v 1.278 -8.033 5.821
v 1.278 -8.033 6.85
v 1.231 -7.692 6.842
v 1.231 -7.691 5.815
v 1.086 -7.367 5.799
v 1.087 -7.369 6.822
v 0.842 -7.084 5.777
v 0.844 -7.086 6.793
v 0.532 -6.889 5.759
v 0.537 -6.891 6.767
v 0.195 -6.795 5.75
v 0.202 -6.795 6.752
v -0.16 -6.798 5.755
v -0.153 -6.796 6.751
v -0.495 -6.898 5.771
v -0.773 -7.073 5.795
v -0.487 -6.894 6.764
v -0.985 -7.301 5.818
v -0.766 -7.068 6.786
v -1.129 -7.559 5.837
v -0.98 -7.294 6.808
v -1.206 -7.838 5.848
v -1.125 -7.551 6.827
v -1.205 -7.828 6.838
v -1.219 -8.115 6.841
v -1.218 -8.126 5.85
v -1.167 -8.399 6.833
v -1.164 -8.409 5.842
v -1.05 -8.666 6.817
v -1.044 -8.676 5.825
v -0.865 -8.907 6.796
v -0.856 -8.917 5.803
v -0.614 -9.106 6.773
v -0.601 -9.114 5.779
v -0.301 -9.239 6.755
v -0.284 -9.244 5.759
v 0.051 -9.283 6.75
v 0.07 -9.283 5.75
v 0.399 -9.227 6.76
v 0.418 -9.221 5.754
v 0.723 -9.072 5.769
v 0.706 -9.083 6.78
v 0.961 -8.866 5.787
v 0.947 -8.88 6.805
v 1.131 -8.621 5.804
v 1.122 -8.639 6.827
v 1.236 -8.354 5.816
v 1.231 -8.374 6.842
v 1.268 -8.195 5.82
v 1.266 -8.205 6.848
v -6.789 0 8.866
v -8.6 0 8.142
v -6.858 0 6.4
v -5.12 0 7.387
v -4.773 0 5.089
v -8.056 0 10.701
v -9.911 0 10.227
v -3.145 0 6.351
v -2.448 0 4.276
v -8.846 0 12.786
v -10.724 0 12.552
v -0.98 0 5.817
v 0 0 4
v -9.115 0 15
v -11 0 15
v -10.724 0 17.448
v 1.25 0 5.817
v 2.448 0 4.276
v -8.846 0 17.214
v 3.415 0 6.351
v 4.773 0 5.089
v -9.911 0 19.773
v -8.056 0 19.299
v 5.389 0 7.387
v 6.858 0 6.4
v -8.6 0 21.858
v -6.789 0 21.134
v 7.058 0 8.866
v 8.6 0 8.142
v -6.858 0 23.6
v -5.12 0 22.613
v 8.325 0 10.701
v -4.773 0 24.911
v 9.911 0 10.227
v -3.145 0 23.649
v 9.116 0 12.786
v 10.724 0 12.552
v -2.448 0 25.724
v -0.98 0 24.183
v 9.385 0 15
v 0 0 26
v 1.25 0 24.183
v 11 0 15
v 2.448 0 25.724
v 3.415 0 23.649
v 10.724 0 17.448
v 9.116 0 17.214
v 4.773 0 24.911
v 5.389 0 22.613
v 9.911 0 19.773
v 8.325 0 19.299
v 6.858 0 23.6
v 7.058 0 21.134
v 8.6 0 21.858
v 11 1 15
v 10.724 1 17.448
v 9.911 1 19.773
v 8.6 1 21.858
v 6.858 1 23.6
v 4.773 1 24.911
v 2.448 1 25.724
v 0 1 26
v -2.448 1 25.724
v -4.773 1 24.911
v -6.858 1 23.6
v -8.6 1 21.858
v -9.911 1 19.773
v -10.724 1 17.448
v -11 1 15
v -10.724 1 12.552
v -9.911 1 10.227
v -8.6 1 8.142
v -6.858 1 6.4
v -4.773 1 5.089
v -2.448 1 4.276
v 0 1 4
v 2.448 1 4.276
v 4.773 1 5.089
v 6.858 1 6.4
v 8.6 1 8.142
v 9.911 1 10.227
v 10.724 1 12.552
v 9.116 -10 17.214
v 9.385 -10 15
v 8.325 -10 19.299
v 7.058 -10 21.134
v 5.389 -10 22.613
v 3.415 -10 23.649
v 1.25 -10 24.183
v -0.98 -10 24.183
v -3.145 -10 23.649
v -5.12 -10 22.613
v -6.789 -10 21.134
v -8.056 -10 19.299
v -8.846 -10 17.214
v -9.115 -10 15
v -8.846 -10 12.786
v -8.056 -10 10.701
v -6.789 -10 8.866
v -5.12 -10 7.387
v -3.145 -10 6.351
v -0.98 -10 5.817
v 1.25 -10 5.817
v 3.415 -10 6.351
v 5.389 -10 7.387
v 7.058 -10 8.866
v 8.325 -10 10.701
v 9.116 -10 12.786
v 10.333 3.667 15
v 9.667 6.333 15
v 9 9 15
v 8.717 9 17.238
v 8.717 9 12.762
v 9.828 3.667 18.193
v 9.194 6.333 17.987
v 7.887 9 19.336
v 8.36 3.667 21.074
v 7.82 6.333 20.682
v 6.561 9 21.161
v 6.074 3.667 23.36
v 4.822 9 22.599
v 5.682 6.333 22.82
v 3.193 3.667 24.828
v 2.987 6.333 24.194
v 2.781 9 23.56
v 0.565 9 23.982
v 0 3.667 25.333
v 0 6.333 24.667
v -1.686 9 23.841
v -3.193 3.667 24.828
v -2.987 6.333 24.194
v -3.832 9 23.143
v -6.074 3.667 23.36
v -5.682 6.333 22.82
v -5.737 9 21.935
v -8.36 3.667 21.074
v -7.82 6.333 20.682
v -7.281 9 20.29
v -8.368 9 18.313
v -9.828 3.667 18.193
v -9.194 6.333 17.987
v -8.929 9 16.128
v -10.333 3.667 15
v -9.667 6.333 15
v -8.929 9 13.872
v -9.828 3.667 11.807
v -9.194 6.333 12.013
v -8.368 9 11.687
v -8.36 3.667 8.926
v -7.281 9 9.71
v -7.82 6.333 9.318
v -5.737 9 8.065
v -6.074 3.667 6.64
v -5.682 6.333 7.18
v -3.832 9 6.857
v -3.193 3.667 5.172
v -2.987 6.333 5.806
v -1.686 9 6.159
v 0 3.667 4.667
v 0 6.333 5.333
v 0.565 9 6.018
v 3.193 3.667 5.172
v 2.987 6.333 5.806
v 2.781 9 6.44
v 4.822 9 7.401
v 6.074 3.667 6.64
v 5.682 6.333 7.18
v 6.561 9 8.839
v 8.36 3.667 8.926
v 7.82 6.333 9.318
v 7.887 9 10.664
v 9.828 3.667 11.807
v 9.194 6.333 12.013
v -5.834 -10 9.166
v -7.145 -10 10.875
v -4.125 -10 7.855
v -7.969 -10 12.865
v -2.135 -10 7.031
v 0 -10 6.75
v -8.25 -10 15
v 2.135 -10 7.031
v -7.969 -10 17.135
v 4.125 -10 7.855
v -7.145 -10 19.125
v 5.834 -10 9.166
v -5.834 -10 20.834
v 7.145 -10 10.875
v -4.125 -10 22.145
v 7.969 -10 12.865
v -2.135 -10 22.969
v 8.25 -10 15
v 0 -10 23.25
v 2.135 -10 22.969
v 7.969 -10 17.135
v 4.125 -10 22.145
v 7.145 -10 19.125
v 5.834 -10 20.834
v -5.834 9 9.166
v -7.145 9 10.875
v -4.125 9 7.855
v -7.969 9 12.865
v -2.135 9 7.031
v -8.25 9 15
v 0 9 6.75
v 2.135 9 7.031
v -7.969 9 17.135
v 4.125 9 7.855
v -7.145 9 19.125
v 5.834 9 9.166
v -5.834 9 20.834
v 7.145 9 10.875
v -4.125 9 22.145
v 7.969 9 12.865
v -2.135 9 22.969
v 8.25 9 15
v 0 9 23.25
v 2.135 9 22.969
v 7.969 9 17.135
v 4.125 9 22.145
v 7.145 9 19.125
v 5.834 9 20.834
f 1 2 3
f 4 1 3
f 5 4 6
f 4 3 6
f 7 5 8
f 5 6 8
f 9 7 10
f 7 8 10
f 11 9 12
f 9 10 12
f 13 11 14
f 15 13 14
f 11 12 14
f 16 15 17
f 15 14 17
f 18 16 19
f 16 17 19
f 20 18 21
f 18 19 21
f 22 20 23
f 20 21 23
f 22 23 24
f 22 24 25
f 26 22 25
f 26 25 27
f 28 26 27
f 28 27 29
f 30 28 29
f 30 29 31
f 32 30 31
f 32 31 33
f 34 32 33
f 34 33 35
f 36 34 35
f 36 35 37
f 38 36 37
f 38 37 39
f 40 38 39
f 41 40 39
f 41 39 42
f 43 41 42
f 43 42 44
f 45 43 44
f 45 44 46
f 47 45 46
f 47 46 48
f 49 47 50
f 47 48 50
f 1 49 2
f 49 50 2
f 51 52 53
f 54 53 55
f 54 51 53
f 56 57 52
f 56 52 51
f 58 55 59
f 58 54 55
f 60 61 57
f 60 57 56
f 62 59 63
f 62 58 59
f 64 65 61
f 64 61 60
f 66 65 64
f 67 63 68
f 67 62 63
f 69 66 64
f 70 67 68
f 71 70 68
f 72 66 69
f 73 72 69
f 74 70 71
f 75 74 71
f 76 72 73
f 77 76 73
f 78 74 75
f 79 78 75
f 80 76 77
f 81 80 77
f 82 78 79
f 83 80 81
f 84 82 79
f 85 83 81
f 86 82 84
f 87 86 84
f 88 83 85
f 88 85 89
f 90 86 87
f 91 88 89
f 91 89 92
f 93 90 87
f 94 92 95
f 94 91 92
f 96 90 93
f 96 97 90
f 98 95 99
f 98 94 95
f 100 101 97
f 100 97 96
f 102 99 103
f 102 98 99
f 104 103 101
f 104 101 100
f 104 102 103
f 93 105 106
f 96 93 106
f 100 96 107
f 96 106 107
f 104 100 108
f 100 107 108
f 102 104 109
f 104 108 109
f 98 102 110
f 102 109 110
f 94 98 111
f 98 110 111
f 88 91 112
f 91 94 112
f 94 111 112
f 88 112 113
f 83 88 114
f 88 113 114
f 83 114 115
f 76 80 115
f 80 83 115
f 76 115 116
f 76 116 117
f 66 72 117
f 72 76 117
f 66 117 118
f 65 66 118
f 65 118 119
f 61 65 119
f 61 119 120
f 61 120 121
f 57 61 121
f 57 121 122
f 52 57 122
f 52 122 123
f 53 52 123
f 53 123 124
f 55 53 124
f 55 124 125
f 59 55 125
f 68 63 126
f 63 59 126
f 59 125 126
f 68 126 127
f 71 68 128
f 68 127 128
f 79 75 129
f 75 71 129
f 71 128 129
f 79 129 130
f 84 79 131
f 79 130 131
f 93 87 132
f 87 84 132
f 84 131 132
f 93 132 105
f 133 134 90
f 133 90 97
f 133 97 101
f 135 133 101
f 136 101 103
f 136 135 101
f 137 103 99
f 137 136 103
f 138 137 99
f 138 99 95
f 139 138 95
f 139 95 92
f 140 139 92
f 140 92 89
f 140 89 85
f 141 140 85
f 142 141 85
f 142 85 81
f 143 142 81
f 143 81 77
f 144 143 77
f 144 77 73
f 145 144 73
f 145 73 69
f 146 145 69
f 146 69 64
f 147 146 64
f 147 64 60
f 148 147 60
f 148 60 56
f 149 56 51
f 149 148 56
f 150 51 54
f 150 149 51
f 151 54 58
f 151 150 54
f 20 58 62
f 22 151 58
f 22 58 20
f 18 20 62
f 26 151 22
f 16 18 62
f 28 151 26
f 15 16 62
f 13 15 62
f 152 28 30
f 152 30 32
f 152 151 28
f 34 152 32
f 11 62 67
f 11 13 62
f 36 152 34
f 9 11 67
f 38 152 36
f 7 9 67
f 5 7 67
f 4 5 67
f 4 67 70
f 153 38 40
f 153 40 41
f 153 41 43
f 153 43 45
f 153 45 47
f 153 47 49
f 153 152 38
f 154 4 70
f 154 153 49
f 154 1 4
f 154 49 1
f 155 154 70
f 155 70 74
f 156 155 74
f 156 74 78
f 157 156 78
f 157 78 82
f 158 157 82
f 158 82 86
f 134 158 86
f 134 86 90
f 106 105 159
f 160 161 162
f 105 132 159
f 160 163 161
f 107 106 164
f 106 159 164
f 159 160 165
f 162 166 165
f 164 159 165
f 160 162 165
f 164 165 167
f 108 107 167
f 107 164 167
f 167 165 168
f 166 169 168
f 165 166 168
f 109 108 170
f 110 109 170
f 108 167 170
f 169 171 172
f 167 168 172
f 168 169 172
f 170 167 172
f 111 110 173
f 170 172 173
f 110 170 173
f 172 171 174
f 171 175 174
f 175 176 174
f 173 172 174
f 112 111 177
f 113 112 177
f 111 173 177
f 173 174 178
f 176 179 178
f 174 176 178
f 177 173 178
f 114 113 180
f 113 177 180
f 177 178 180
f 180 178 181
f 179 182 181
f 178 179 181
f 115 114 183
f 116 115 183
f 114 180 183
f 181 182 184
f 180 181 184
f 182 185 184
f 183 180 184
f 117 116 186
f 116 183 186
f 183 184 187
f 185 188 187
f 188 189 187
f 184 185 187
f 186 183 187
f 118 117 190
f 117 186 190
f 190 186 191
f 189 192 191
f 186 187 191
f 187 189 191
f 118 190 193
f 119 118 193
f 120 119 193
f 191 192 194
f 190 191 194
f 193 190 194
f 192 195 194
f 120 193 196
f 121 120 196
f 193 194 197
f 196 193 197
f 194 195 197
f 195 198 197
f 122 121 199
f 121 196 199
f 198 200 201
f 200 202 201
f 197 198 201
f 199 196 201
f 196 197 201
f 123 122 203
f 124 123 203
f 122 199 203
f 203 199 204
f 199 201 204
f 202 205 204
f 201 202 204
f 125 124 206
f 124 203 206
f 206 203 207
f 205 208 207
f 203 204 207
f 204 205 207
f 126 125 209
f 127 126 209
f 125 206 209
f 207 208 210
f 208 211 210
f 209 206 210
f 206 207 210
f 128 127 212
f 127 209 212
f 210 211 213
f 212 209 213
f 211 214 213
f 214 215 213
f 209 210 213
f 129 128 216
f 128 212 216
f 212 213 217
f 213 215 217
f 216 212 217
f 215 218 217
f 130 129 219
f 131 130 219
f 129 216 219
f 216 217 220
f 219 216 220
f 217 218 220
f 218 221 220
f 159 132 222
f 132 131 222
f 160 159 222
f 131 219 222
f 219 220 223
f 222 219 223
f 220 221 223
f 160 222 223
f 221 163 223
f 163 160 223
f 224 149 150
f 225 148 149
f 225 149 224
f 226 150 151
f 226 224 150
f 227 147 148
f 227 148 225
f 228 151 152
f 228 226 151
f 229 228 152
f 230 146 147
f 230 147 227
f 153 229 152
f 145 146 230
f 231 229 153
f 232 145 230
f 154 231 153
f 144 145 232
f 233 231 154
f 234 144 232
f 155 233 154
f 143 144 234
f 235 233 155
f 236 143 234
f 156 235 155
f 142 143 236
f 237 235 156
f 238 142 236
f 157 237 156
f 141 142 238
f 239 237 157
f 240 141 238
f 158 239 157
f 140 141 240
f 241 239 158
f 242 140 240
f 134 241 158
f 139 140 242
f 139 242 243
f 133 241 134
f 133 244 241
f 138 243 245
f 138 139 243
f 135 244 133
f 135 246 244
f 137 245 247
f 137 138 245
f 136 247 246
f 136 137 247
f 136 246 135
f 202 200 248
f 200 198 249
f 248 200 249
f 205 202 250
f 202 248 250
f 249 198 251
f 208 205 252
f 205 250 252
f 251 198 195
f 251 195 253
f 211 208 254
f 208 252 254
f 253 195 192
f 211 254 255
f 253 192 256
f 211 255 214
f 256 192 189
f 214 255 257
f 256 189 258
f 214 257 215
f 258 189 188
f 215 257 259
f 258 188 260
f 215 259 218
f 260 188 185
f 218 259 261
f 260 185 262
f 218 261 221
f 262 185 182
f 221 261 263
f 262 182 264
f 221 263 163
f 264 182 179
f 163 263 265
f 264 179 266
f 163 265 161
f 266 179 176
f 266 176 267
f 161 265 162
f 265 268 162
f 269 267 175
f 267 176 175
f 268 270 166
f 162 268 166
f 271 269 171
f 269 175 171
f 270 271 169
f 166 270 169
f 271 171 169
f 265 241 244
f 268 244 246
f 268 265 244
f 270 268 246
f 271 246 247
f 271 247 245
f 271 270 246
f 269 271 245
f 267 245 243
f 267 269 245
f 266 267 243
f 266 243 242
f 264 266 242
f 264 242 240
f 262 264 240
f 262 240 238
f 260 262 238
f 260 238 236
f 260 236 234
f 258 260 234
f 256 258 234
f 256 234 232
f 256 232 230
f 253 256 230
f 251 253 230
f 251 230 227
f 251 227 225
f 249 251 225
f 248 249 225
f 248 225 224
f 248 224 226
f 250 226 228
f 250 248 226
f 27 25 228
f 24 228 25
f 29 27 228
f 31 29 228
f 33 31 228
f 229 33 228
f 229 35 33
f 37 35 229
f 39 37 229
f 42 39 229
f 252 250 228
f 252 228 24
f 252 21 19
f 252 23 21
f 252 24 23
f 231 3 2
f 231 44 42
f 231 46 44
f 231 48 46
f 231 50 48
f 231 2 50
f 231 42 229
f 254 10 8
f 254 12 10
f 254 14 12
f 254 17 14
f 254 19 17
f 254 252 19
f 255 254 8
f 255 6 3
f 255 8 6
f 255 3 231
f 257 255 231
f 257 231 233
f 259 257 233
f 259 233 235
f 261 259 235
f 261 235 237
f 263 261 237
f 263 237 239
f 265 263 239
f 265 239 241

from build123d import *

# Parameters (mm, degrees)
SKETCH010_R      = 11
SKETCH010_R_2    = 8.25
PAD005_DEPTH     = 19
SKETCH011_R      = 11.25
SKETCH011_R_2    = 9.25
POCKET005_DEPTH  = 10
CHAMFER003_SIZE2 = 2
CHAMFER003_SIZE  = 8
SKETCH012_R      = 1.25
HOLE_DEPTH       = 25


with BuildPart() as part:
    # Sketch010 → Pad005 (new body)
    with BuildSketch(Plane.XZ.offset(-10)):
        with Locations((0, 15)):
            Circle(SKETCH010_R)
        with Locations((0, 15)):
            Circle(SKETCH010_R_2, mode=Mode.SUBTRACT)
    extrude(amount=PAD005_DEPTH)

    # Sketch011 → Pocket005 (cut)
    with BuildSketch(Plane.XZ.offset(9)):
        with Locations((0.134772, 15)):
            Circle(SKETCH011_R)
        with Locations((0.134772, 15)):
            Circle(SKETCH011_R_2, mode=Mode.SUBTRACT)
    extrude(amount=-POCKET005_DEPTH, mode=Mode.SUBTRACT)

    # Chamfer003
    chamfer003_edges = [part.edges().sort_by_distance(p)[0] for p in [
        (-11, 10, 15),
    ]]
    chamfer003_side = part.faces().sort_by_distance((-11, 5.5, 15))[0]
    chamfer(chamfer003_edges, length=CHAMFER003_SIZE, length2=CHAMFER003_SIZE2, reference=chamfer003_side)

    # Sketch012 → Hole (cut)
    with BuildSketch(Plane.XY.offset(7)):
        with Locations((0.028156, -7.033275)):
            Circle(SKETCH012_R)
    extrude(amount=-HOLE_DEPTH, mode=Mode.SUBTRACT)


with BuildPart() as part_1:
    # Body006 placement: moved
    add(part.part.moved(Location((0, -1, 0))))


solid = part_1.part
